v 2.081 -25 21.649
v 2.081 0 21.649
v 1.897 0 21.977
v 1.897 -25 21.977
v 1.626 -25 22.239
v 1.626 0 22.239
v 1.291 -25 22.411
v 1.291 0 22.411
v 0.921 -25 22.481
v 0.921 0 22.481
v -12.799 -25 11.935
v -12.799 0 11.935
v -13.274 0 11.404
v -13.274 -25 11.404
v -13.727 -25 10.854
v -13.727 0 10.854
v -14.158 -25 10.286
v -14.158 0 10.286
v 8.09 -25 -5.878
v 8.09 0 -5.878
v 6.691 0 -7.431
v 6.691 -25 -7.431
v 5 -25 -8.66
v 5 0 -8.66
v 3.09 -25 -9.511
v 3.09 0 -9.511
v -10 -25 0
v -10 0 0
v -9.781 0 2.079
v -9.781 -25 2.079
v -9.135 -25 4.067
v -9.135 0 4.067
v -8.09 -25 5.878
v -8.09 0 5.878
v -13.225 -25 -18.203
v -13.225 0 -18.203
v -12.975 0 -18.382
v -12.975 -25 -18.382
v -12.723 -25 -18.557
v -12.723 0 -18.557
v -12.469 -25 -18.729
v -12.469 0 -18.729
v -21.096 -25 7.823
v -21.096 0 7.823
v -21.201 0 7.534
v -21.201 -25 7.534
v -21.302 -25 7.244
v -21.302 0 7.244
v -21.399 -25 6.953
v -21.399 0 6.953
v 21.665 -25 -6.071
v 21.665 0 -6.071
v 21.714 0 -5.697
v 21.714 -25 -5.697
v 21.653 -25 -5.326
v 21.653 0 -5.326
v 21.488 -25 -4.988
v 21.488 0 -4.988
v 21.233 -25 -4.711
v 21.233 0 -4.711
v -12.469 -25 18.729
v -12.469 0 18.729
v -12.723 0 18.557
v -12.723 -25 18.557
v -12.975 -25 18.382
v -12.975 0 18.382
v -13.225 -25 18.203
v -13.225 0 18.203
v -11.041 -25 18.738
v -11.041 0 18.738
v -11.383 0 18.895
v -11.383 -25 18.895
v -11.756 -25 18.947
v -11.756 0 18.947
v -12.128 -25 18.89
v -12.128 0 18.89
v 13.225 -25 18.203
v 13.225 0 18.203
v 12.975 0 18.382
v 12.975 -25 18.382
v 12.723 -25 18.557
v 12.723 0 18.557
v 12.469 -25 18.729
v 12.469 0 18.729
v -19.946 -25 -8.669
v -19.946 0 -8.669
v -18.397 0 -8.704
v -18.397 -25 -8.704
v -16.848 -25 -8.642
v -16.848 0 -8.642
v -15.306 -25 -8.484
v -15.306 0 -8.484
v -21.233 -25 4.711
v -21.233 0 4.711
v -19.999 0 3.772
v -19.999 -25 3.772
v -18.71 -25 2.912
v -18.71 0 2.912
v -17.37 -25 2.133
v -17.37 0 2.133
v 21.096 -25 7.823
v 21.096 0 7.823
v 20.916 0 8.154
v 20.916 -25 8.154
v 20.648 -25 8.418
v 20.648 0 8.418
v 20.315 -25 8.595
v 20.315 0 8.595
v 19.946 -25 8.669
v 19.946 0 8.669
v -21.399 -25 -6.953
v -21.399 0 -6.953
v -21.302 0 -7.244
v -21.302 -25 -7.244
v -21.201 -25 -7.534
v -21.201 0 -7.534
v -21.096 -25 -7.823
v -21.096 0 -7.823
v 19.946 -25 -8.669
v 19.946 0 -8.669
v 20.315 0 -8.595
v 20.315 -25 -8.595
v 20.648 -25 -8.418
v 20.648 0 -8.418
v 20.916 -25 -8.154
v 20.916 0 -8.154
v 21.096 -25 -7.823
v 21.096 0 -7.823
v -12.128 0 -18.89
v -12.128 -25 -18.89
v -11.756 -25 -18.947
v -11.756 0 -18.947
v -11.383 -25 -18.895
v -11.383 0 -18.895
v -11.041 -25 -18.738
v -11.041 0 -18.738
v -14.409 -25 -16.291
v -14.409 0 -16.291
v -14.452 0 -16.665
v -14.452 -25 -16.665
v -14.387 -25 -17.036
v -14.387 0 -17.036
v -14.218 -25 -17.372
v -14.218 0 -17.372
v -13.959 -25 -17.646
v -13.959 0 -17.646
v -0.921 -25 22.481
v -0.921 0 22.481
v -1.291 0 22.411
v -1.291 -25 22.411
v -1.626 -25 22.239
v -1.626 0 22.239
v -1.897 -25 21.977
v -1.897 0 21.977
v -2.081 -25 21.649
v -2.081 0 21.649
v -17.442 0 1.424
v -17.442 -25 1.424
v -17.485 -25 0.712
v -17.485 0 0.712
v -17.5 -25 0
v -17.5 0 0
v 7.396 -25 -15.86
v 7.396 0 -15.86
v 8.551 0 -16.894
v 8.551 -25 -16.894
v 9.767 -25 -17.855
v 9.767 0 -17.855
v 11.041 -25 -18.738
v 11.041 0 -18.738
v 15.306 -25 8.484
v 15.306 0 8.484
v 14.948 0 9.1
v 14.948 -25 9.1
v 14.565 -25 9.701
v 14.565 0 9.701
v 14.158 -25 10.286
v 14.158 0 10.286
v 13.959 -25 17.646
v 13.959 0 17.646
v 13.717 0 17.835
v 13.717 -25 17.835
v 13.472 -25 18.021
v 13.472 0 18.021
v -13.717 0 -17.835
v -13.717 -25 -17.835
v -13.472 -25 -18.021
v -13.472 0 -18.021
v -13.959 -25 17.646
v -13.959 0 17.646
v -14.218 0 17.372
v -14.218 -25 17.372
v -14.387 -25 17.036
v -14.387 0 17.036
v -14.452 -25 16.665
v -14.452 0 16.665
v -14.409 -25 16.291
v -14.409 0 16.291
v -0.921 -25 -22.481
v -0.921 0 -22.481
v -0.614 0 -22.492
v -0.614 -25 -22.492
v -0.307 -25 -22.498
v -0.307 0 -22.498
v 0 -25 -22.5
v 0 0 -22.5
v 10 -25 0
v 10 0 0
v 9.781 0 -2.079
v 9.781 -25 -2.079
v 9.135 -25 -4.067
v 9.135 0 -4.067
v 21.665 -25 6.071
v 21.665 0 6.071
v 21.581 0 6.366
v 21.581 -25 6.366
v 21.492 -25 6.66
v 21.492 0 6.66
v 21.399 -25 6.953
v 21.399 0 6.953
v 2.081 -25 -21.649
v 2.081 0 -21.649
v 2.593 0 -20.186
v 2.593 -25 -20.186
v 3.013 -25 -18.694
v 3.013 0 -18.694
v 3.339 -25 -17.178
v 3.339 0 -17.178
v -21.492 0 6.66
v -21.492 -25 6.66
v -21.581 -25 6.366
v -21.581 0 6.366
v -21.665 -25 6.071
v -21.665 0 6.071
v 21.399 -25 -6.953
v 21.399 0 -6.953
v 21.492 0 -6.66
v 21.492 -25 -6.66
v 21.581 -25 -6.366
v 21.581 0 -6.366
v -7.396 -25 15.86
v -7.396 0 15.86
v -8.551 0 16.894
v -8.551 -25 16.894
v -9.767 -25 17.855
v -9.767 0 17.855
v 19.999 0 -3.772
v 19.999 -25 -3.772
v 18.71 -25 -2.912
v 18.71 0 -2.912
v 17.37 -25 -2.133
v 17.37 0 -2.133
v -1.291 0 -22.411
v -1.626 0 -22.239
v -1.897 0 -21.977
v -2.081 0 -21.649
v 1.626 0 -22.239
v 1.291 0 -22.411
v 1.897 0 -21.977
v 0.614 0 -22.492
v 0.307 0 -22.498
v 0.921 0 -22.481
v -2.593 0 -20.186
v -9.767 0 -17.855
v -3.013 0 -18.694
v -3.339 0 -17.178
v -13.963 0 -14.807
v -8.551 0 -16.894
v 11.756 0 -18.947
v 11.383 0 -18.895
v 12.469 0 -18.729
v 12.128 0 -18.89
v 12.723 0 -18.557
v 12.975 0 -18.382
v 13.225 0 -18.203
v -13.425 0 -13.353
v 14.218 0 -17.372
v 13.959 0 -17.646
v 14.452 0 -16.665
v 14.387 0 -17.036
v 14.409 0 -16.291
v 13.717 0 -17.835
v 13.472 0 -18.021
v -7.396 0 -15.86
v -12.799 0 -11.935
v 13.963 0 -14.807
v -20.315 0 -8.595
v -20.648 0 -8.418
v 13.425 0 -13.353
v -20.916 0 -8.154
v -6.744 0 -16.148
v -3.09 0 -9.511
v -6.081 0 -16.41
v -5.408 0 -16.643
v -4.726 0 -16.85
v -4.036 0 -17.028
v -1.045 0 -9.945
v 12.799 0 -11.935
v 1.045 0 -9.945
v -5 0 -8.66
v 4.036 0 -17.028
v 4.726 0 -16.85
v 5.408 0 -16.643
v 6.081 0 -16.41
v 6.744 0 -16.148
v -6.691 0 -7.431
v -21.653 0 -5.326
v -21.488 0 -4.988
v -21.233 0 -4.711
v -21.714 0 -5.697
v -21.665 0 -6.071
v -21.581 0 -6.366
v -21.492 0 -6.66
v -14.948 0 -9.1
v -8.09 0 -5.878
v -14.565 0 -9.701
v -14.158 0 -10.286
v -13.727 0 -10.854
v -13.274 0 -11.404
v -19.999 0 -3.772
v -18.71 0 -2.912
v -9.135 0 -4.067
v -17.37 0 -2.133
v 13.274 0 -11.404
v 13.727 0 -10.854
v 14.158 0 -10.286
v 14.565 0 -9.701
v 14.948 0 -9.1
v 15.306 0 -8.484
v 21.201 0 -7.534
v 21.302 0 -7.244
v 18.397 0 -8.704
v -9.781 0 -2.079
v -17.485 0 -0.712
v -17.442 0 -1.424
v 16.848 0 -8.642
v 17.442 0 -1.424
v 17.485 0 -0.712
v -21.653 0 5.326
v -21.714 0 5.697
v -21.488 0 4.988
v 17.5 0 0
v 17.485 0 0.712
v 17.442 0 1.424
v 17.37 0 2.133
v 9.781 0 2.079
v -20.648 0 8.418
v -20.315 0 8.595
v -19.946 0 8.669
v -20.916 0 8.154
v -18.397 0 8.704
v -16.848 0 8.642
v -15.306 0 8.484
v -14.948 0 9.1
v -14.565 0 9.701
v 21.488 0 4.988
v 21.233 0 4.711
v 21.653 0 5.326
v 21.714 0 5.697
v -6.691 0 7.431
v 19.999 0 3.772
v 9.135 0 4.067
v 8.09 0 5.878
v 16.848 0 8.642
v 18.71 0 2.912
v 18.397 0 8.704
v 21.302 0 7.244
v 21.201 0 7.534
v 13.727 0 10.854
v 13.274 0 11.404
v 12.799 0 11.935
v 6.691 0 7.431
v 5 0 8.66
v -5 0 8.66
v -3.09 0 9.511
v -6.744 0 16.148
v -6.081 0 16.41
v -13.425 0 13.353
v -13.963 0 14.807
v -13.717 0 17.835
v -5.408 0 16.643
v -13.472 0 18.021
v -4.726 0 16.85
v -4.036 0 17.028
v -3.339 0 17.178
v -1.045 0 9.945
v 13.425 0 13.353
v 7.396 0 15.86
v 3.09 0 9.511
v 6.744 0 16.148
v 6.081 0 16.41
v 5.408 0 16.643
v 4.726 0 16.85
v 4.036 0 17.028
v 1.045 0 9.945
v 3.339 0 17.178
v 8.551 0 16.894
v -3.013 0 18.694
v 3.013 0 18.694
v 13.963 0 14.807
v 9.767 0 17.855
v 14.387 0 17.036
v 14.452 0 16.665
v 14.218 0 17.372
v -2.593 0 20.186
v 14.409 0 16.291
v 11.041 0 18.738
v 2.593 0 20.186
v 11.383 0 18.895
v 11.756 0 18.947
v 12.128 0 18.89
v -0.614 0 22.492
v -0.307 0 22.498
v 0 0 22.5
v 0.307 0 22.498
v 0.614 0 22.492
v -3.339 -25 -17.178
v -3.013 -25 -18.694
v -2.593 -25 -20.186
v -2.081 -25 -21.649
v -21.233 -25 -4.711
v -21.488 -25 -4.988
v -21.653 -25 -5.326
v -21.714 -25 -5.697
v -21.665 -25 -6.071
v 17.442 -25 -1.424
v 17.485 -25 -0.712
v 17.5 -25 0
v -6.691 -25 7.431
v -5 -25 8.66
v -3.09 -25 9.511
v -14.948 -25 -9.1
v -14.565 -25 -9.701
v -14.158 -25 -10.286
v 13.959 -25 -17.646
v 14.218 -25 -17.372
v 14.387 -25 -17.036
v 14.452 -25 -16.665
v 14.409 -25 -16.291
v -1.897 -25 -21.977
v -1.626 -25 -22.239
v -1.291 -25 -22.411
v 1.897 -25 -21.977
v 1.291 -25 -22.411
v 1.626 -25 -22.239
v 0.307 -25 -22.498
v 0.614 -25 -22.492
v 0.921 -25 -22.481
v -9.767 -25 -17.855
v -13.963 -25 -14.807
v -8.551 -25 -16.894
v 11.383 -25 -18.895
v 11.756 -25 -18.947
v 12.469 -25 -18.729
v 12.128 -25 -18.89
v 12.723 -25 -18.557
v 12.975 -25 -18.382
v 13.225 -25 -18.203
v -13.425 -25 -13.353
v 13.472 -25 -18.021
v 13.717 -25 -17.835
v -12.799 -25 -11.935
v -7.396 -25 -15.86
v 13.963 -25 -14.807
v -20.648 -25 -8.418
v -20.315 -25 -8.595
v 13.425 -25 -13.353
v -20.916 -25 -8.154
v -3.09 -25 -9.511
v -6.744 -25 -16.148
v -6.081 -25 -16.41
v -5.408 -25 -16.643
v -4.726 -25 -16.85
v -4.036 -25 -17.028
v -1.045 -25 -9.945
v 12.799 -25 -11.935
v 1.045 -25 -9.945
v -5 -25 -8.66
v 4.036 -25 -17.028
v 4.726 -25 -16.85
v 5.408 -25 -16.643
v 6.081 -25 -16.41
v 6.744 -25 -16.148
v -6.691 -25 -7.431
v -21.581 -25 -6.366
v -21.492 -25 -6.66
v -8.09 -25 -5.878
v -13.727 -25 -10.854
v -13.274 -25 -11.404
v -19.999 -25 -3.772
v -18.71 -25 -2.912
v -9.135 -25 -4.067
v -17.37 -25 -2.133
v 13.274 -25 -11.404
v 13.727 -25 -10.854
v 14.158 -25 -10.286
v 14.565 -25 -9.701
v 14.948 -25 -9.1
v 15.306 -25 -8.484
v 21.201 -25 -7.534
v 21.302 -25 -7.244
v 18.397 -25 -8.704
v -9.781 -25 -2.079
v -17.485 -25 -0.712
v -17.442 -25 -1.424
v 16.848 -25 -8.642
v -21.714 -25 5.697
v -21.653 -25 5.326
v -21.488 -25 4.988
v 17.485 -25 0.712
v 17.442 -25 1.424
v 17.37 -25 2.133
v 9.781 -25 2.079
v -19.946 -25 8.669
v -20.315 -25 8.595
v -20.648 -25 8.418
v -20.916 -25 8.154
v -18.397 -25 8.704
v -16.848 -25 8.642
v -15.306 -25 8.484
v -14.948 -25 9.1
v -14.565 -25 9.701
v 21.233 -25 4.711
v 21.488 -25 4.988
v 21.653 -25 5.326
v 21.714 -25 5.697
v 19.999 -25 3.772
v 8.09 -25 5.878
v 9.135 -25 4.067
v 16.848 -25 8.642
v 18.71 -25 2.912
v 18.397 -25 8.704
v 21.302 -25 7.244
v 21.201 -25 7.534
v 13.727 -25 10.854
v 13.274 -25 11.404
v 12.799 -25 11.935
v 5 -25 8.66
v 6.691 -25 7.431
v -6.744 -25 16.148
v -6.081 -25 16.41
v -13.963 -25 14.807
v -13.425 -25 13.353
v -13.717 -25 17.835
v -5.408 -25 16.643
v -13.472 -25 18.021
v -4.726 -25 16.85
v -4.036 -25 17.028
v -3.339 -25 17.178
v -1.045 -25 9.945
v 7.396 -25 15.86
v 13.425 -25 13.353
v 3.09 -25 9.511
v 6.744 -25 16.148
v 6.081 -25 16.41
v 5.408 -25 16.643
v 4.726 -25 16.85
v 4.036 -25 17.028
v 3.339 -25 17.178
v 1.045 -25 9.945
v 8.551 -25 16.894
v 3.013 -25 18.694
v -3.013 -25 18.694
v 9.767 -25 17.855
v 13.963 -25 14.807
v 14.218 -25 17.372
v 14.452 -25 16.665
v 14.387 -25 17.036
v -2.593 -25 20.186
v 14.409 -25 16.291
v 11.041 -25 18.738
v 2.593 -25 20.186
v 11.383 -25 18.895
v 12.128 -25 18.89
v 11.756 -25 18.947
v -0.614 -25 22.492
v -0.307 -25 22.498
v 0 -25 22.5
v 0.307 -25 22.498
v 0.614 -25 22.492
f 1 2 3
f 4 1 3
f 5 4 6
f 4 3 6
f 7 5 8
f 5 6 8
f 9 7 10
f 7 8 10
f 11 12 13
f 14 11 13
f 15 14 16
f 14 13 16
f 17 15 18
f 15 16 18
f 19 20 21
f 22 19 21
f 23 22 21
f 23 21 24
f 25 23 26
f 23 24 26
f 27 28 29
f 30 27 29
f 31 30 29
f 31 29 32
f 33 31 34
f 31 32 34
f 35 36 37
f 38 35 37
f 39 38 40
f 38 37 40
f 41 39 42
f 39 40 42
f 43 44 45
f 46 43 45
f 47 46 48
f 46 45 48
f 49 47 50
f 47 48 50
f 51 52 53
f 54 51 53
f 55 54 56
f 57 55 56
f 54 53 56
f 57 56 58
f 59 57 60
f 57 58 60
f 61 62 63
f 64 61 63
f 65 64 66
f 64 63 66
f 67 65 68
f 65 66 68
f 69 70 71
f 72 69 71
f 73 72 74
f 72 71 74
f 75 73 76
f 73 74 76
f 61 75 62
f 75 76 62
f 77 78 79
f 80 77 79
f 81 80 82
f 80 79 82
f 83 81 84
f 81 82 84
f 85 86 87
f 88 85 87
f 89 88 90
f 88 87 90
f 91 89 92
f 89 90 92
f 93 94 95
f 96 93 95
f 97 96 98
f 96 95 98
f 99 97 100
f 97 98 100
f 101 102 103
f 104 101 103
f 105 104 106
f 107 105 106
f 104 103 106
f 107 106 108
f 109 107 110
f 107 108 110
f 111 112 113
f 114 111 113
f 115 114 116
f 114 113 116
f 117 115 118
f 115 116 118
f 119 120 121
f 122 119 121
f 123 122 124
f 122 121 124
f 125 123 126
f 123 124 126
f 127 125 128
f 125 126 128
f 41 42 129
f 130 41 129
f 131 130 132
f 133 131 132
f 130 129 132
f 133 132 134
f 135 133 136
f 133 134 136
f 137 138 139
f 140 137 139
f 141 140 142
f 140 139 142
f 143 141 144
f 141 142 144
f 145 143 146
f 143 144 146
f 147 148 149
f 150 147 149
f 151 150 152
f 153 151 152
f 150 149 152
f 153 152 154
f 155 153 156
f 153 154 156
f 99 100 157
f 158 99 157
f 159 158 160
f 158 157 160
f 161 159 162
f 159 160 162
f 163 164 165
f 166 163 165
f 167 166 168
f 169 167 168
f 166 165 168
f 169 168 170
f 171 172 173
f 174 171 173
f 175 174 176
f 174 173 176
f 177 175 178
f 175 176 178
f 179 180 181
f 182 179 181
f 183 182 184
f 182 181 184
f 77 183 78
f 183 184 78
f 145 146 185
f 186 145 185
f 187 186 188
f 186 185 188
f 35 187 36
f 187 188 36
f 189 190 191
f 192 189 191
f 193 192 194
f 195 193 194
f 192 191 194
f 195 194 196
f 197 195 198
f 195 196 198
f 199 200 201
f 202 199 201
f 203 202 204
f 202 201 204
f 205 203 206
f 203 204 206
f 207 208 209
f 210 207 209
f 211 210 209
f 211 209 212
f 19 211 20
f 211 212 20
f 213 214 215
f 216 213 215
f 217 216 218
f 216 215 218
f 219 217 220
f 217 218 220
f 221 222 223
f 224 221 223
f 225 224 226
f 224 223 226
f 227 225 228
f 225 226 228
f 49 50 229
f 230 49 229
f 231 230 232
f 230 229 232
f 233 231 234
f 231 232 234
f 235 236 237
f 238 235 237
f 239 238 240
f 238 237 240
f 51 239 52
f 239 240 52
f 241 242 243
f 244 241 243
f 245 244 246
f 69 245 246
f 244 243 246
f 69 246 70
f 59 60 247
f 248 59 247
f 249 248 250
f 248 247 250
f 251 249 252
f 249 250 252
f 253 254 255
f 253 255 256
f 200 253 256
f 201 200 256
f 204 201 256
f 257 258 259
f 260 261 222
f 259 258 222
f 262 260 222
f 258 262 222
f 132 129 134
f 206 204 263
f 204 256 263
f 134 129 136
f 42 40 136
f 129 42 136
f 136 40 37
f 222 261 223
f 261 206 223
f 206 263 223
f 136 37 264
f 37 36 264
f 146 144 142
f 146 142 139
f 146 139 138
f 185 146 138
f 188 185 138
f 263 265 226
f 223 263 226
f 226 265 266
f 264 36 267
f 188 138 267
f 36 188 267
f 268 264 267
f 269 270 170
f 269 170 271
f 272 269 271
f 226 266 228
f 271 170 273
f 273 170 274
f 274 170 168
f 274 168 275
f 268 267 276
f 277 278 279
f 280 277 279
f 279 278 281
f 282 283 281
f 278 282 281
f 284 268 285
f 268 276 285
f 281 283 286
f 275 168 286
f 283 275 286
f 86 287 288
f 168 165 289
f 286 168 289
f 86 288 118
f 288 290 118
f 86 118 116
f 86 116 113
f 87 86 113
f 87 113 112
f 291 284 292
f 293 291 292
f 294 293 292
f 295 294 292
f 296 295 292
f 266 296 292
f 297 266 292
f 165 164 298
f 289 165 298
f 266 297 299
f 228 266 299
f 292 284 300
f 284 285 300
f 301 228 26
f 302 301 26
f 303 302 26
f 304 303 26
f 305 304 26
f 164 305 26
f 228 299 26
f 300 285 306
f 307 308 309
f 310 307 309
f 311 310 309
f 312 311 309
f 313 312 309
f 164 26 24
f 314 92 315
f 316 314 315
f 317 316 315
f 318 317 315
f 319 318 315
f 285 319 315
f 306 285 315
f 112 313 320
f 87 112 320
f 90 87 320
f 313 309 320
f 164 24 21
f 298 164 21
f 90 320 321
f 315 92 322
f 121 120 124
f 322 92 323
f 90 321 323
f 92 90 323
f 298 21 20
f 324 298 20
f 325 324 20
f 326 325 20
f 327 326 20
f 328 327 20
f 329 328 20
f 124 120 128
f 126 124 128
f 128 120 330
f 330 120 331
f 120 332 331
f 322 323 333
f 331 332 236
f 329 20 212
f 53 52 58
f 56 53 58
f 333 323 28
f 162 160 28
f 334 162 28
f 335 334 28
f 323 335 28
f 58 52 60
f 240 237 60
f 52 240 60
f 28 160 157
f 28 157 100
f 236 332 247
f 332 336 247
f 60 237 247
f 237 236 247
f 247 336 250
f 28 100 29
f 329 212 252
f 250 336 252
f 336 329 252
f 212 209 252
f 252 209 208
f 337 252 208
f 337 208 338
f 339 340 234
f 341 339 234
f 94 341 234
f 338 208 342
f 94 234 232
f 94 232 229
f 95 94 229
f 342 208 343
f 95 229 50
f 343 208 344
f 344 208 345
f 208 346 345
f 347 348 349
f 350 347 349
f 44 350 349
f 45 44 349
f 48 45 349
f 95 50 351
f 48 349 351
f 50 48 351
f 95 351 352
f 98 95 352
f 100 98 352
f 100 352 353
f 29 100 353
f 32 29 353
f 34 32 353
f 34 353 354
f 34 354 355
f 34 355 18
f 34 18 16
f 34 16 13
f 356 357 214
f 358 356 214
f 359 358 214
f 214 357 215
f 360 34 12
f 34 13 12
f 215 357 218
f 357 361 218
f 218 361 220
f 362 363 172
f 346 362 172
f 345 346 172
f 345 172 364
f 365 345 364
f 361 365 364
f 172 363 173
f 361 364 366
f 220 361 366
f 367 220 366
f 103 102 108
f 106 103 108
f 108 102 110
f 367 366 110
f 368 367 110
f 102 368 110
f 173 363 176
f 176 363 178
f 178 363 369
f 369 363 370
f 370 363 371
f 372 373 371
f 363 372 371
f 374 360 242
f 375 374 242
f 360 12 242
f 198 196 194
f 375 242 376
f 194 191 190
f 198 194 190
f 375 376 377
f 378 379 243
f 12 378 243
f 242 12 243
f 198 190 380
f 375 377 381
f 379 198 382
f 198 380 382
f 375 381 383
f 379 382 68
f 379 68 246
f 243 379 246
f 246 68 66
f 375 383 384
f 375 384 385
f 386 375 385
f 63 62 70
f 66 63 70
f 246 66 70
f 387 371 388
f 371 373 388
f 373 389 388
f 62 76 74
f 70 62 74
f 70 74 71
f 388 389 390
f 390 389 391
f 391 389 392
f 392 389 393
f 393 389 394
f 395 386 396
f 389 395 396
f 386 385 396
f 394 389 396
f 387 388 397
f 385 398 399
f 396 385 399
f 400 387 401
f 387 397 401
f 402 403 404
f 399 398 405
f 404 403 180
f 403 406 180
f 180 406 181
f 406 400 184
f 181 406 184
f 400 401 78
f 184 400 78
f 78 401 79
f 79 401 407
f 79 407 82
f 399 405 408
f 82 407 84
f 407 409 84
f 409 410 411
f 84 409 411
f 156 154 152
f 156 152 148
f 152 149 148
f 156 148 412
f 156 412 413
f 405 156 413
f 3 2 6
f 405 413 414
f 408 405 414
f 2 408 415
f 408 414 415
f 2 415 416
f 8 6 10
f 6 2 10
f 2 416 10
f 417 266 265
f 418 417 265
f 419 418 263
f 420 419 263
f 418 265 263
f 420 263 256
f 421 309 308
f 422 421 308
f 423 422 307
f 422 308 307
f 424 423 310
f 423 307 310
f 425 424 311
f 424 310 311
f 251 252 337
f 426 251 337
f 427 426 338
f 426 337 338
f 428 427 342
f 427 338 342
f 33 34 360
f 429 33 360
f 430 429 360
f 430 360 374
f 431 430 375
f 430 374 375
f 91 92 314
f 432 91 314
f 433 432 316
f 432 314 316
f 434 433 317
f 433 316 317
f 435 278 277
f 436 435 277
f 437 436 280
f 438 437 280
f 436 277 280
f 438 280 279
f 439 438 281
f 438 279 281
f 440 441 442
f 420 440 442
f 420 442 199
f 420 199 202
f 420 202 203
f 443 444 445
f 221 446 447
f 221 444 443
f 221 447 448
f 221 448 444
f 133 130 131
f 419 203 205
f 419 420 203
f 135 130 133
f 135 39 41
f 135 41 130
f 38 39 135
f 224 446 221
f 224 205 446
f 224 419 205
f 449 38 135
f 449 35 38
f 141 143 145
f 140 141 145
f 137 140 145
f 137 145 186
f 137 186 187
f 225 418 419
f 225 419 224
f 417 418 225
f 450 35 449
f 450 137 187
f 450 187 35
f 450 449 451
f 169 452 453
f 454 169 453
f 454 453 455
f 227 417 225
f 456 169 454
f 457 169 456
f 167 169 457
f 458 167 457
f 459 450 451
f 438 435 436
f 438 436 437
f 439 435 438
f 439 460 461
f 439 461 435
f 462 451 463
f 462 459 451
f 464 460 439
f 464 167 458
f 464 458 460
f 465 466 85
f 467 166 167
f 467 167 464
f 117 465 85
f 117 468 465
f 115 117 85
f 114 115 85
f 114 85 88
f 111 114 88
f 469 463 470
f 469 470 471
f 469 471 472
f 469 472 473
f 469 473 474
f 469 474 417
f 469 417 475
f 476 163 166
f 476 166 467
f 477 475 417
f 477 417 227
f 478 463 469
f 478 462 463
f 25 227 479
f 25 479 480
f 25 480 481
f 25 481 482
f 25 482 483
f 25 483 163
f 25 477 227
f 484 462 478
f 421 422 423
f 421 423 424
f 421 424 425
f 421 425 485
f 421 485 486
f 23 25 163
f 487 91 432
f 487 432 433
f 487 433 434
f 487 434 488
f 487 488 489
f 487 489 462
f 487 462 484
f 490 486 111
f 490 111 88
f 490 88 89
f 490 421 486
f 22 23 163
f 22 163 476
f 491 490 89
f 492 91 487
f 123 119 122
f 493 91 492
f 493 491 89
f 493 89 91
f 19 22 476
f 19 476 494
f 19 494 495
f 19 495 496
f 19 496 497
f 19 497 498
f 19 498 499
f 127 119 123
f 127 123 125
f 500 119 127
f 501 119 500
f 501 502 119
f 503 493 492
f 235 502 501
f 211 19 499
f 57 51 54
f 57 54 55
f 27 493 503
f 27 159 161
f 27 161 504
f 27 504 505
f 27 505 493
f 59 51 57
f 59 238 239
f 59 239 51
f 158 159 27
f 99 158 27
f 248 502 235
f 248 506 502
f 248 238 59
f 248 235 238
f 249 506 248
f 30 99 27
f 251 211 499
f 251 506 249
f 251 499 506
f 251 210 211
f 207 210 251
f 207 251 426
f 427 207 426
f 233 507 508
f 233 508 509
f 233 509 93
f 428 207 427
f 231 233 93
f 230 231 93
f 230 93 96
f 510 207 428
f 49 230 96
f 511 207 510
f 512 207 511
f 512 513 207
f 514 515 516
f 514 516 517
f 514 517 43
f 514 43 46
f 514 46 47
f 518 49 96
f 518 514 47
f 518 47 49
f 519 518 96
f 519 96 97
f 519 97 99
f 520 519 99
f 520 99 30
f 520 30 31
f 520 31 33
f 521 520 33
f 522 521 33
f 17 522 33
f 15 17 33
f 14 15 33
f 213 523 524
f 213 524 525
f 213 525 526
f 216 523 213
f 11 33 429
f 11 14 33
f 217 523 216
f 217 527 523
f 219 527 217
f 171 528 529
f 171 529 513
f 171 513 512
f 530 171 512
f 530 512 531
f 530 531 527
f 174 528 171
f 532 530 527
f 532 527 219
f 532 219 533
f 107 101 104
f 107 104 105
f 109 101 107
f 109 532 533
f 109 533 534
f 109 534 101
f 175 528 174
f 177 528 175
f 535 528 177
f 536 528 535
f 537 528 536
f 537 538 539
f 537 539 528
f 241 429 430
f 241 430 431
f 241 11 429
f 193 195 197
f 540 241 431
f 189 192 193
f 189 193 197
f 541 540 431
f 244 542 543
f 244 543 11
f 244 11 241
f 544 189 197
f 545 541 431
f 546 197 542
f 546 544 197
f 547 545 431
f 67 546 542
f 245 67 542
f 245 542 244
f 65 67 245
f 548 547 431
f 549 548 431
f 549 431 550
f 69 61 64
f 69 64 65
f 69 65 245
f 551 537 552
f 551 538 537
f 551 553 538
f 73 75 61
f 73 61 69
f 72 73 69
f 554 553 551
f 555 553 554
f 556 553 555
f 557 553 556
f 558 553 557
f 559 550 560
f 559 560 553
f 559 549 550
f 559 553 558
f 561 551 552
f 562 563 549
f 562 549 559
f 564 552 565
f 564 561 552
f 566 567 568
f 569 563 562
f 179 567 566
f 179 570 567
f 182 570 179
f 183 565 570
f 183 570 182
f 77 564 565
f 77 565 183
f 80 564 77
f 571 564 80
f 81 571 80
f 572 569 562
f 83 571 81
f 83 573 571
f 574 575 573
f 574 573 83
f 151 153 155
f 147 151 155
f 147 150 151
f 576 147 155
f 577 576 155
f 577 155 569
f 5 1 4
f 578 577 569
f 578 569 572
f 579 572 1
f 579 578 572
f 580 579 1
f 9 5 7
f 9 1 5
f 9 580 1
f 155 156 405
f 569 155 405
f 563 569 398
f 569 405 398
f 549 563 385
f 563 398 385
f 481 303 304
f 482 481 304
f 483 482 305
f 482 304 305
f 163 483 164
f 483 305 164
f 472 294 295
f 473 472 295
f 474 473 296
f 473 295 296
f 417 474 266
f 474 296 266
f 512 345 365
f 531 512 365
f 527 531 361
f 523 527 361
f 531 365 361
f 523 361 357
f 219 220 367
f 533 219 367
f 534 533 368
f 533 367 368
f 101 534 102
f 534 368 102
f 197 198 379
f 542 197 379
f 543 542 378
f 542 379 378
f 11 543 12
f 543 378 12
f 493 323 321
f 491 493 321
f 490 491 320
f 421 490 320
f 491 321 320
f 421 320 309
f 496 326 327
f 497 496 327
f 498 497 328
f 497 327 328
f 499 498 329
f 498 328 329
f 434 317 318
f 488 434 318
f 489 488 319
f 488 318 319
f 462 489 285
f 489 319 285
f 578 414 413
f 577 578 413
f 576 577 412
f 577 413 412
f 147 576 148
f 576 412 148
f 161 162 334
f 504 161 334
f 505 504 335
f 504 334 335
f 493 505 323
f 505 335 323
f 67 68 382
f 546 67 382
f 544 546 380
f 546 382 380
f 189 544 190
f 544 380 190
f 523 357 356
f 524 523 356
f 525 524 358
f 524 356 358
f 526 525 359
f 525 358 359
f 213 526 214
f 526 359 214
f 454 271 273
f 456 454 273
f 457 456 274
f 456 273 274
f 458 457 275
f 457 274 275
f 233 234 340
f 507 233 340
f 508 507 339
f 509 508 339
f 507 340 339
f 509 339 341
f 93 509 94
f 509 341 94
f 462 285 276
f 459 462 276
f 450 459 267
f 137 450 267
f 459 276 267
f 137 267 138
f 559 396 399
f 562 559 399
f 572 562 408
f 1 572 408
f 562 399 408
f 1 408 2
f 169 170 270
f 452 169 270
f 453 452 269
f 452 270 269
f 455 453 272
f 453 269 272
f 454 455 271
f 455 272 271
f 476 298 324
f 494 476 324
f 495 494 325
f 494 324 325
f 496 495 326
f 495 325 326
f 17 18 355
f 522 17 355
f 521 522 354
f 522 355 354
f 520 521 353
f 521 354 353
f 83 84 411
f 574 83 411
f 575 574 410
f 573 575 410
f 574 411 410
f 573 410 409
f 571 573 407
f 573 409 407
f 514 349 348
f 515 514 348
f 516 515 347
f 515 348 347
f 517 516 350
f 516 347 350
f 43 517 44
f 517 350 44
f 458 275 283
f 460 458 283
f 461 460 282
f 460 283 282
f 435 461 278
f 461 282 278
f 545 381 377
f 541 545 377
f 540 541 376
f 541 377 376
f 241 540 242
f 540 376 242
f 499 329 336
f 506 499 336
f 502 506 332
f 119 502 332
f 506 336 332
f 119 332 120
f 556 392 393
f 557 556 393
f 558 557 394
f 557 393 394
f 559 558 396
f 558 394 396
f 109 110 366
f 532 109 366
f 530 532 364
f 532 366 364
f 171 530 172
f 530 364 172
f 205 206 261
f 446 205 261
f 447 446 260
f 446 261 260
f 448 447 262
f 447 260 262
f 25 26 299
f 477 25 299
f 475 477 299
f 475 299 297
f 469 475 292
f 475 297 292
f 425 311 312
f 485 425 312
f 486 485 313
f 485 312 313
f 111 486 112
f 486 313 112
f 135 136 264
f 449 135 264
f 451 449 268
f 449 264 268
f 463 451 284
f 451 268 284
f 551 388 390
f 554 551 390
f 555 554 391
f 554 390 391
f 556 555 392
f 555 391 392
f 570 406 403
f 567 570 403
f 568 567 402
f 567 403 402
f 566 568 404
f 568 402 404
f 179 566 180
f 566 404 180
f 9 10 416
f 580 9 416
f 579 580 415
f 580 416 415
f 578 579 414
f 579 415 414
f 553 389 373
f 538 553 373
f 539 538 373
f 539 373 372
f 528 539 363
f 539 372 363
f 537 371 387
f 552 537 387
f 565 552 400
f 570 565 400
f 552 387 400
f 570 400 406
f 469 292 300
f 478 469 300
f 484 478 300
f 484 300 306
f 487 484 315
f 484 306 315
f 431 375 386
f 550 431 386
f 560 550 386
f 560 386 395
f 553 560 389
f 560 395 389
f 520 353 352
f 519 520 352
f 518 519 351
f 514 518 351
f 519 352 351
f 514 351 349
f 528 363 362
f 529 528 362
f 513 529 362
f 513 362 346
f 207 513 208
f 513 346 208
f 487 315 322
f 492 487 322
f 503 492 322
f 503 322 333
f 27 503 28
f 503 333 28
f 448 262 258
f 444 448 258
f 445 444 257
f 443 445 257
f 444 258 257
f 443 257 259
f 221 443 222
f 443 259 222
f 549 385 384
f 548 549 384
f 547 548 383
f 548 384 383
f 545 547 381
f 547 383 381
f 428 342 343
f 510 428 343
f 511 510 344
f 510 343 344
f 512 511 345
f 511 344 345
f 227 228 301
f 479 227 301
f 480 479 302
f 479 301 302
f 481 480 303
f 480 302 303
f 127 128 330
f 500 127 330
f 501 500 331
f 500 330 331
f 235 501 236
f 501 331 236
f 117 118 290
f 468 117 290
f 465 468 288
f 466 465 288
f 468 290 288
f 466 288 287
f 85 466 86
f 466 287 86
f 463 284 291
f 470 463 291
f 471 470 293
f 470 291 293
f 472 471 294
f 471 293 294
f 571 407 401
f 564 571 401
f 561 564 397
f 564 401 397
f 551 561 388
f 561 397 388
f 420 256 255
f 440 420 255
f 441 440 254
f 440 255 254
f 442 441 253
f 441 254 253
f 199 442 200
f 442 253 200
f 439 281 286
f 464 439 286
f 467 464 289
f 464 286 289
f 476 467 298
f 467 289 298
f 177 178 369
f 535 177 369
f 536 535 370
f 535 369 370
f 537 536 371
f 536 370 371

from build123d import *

# Parameters (mm, degrees)
F1_DEPTH = 25
F2_COUNT = 10


with BuildPart() as f1:
    # F0 (on Front) → F1 (new body)
    with BuildSketch(Plane.XZ):
        with BuildLine():
            ThreePointArc((-3.0901699437, 9.510565163), (0, 10), (3.0901699437, 9.510565163))
            Line((3.0901699437, 9.510565163), (5.4077974016, 16.6434890352))
            ThreePointArc((5.4077974016, 16.6434890352), (4.381650071, 16.9425837066), (3.3391574191, 17.1784757103))
            ThreePointArc((3.3391574191, 17.1784757103), (2.8142548796, 19.4430311858), (2.081282357, 21.6490423958))
            ThreePointArc((2.081282357, 21.6490423958), (1.6256906438, 22.2385798355), (0.9212150037, 22.4811334883))
            ThreePointArc((0.9212150037, 22.4811334883), (0.4607040884, 22.4952828776), (0, 22.5))
            ThreePointArc((0, 22.5), (-0.4607040884, 22.4952828776), (-0.9212150037, 22.4811334883))
            ThreePointArc((-0.9212150037, 22.4811334883), (-1.6256906438, 22.2385798355), (-2.081282357, 21.6490423958))
            ThreePointArc((-2.081282357, 21.6490423958), (-2.8142548796, 19.4430311858), (-3.3391574191, 17.1784757103))
            ThreePointArc((-3.3391574191, 17.1784757103), (-4.381650071, 16.9425837066), (-5.4077974016, 16.6434890352))
            Line((-5.4077974016, 16.6434890352), (-3.0901699437, 9.510565163))
        make_face()
    extrude(amount=F1_DEPTH)

    # F2: F1 ×10 about axis
    f2_axis = Axis((0, 0, 0), (0, 1, 0))


with BuildPart() as f1_1:
    add(f1.part)
    for i in range(1, F2_COUNT):
        add(f1.part.rotate(f2_axis, i * 360 / F2_COUNT))


solid = f1_1.part
